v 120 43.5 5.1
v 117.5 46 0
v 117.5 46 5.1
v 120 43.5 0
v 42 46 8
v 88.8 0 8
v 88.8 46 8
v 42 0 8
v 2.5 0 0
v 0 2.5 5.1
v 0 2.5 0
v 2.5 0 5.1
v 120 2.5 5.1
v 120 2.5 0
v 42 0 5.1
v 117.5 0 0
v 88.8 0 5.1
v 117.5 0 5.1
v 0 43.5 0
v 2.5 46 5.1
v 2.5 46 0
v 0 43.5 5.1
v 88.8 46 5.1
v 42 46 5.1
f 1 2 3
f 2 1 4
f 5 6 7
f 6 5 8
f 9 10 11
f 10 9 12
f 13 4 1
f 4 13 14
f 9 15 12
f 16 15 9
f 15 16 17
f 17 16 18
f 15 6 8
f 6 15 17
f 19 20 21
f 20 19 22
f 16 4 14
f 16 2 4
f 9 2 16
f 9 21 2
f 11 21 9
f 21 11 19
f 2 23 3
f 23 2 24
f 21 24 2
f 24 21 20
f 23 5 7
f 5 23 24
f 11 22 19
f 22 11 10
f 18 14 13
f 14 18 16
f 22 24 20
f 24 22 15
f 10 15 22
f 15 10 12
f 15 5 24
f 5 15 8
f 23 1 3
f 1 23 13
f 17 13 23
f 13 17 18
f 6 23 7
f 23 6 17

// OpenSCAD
$fn = 32;

// ----------------------------------------------------------------------
// Stepped bar: centerstep, 120 x 46 x 8/5.1 mm
// ----------------------------------------------------------------------

// --- parameters (mm) ---
bar_l = 120;              // bar length, X
bar_w = 46;               // bar width, Y
plate_t = 8;              // thickness of the thick zone, Z
thin_t = 5.1;             // thickness of the thin zone
corner_c = 2.5;           // corner chamfer of the bar
step_cut = 2.9;           // material removed from the thin zone
thick_from = 42;          // start of the thick middle zone
thick_to = 88.8;          // end of the thick middle zone
depth_1 = 2.9;            // depth of cut 1 from the top face
depth_2 = 2.9;            // depth of cut 2 from the top face
fit_tol = 0.1;            // declared fit tolerance (prompt contract)
free_tol = 0.3;           // declared free tolerance (prompt contract)

profile = [[2.5, 0], [117.5, 0], [120, 2.5], [120, 43.5], [117.5, 46], [2.5, 46], [0, 43.5], [0, 2.5]];  // primary outline, 8 points, counter clockwise
void_1 = [[-1, -1], [42, -1], [42, 47], [-1, 47]];  // thin left end, 4 points
void_2 = [[88.8, -1], [121, -1], [121, 47], [88.8, 47]];  // thin right end, 4 points

// --- the one profile operation ---
difference() {
  linear_extrude(height = plate_t) polygon(points = profile);
  translate([0, 0, plate_t - depth_1])
    linear_extrude(height = depth_1 + 1) polygon(points = void_1);
  translate([0, 0, plate_t - depth_2])
    linear_extrude(height = depth_2 + 1) polygon(points = void_2);
}
